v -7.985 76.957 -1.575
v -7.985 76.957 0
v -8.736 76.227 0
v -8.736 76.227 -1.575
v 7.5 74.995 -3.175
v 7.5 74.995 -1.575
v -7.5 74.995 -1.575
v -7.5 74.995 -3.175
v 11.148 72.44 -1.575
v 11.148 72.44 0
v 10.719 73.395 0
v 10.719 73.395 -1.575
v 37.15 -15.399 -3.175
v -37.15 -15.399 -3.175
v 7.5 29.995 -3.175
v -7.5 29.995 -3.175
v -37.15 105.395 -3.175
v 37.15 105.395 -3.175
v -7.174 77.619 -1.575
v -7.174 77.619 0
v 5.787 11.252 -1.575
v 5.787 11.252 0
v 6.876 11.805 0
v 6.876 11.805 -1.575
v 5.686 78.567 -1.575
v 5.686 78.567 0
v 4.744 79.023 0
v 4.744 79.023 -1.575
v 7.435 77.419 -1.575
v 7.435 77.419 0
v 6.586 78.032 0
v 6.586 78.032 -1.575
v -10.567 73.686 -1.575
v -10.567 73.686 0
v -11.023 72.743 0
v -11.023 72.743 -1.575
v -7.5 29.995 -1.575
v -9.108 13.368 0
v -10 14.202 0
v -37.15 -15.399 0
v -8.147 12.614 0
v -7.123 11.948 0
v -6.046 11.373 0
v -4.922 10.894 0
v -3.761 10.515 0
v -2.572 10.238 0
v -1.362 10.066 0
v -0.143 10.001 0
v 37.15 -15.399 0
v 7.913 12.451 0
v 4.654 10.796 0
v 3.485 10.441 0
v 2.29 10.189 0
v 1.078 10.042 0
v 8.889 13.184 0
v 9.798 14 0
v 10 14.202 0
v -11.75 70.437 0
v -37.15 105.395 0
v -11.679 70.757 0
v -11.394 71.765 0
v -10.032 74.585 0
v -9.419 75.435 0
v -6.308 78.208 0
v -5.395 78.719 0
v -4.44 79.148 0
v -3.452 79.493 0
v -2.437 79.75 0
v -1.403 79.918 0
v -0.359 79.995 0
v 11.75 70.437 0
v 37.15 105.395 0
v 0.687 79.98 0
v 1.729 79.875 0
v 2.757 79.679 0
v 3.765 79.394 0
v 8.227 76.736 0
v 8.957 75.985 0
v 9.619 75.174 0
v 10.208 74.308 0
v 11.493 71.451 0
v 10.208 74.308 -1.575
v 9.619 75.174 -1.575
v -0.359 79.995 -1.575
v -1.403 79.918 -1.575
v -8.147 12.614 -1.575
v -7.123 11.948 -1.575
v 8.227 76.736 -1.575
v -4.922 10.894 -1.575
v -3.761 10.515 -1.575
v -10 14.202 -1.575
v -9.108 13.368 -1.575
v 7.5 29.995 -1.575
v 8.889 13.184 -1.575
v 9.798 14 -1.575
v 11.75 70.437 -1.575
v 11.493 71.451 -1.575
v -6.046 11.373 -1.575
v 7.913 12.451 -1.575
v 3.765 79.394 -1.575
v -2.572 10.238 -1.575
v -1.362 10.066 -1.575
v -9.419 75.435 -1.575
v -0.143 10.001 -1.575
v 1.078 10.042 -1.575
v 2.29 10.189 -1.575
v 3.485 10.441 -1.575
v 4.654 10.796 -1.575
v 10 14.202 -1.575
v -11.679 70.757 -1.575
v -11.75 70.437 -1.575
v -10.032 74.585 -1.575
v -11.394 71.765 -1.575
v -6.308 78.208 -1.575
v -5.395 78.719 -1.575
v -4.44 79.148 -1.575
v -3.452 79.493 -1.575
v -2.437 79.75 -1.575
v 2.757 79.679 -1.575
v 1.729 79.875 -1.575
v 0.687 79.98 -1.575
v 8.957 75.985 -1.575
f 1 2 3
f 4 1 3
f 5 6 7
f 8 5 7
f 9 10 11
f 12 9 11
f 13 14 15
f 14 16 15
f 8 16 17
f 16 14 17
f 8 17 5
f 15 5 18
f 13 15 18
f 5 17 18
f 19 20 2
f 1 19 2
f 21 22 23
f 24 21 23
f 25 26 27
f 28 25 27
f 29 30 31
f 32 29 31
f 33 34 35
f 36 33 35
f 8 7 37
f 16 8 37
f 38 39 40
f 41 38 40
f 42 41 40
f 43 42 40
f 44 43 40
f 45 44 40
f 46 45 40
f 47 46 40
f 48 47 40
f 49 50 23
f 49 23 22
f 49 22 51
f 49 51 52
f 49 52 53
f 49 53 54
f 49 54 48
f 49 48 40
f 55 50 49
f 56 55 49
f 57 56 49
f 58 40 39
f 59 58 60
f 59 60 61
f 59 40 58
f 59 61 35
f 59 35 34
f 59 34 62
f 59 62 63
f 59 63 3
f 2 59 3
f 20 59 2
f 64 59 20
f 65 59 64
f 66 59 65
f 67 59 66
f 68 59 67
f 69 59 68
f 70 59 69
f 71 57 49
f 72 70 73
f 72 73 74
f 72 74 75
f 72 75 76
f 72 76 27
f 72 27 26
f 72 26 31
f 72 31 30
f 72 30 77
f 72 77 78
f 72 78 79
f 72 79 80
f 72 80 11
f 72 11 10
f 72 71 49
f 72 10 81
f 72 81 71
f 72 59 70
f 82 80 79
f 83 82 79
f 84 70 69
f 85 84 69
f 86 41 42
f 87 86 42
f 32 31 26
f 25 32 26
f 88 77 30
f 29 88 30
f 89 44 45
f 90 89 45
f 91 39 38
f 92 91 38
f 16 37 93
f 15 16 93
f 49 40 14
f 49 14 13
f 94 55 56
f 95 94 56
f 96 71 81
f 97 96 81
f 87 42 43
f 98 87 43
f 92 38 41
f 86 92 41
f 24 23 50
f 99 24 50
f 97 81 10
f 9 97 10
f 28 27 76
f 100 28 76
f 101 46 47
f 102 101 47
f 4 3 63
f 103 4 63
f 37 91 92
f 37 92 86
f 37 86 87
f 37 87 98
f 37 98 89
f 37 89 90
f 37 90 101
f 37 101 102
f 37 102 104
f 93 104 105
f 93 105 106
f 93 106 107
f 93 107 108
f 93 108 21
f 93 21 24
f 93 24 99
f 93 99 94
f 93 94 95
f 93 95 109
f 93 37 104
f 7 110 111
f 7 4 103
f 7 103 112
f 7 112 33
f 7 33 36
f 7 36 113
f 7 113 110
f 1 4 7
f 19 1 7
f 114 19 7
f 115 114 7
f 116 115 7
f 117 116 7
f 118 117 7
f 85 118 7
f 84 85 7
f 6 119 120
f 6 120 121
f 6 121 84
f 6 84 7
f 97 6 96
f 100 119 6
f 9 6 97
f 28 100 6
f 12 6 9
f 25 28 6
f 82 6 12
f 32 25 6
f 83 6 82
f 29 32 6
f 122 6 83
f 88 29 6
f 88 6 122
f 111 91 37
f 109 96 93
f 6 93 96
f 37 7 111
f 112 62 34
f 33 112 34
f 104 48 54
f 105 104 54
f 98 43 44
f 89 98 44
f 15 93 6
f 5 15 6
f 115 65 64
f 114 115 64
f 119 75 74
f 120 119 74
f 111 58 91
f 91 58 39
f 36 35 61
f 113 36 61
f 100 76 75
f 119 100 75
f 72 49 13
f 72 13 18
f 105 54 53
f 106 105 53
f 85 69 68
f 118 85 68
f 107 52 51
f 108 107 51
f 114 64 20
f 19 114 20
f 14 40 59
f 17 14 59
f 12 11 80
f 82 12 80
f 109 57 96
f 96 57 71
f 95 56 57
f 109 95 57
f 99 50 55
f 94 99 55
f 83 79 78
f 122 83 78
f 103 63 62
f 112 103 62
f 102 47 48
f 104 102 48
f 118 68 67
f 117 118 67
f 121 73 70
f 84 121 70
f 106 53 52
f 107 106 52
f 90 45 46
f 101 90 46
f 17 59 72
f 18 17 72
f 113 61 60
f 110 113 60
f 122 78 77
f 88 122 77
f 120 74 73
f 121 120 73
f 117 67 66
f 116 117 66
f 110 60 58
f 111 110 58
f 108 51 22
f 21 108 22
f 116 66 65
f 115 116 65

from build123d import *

# Parameters (mm, degrees)
F1_W     = 74.2999784
F1_H     = 120.793891
F2_DEPTH = 3.175
F3_DEPTH = 1.5748
F5_DEPTH = 1.6012
F7_DEPTH = 187


# Not quite as in the source:
# - an extrude ends at something that could not be found from the text; its depth is read off the source's solid


with BuildPart() as f2:
    # F1 (on Top) → F2 (new body)
    with BuildSketch(Plane.XY):
        with Locations((0, 44.9976621)):
            Rectangle(F1_W, F1_H)
    extrude(amount=-F2_DEPTH)

    # F0 (on Top) → F3 (cut)
    with BuildSketch(Plane.XY):
        Polygon((-11.67892, 70.7573642), (-11.7499892, 70.4366892), (-10.0000054, 14.202029), (-9.1080082, 13.367766), (-8.146669, 12.614402), (-7.1233538, 11.9477028), (-6.045835, 11.372723), (-4.9222914, 10.8938568), (-3.7612828, 10.514711), (-2.5716484, 10.2382066), (-1.3624306, 10.0664518), (-0.142875, 10.0007166), (1.0777982, 10.0415598), (2.2902418, 10.1886004), (3.4852864, 10.4407716), (4.653788, 10.7961176), (5.7868566, 11.2519714), (6.875907, 11.8048532), (7.9126334, 12.4505212), (8.889111, 13.1840986), (9.7979484, 13.9999974), (10.0000054, 14.202029), (11.7499892, 70.4366892), (11.4929158, 71.4514954), (11.1483648, 72.440038), (10.7189524, 73.3947986), (10.2079806, 74.3084874), (9.6193102, 75.1741702), (8.957437, 75.985243), (8.2274156, 76.735559), (7.4347324, 77.4193778), (6.5855088, 78.0315178), (5.6861456, 78.5673054), (4.7435008, 79.0226766), (3.7647626, 79.3941516), (2.7573732, 79.678911), (1.728978, 79.8747958), (0.687451, 79.980282), (-0.3593084, 79.9946076), (-1.40335, 79.917671), (-2.4366982, 79.7500056), (-3.4515044, 79.4929068), (-4.440047, 79.1483558), (-5.3947822, 78.7189688), (-6.3084964, 78.207997), (-7.1741538, 77.6193266), (-7.985252, 76.9574534), (-8.7355426, 76.2274066), (-9.4193614, 75.4347488), (-10.0315014, 74.5854998), (-10.5673144, 73.6861366), (-11.0226602, 72.7434918), (-11.3941352, 71.7647536), align=None)
    extrude(amount=-F3_DEPTH, mode=Mode.SUBTRACT)

    # F4 (on face) → F5 (cut, through all)
    with BuildSketch(Plane.XY.offset(-1.5748)):
        Polygon((7.5, 74.9946076), (-7.5, 74.9946076), (-7.5, 29.9946076), (0, 29.9946076), (7.5, 29.9946076), align=None)
    extrude(amount=-F5_DEPTH, mode=Mode.SUBTRACT)

    # F6 (on Top) → F7 (cut, through all)
    with BuildSketch(Plane.XY):
        Polygon((-10.7912024307, 73.8066075367), (-11.2561967507, 72.8439886266), (-11.6355402146, 71.8445191089), (-11.9253249204, 70.8194431888), (-12.0048558585, 70.4605875443), (-10.2505992593, 14.0886235531), (-9.2734099156, 13.1746824405), (-8.2946132005, 12.4076376674), (-7.2527155028, 11.7288318004), (-6.155627842, 11.1434097699), (-5.0116809128, 10.6558474546), (-3.8295896081, 10.2698167625), (-2.6183487878, 9.9882904244), (-1.3871727116, 9.8134167162), (-0.1454684467, 9.7464876822), (1.0973724592, 9.7880726041), (2.3318323641, 9.9377832588), (3.5485785618, 10.1945338008), (4.7383012319, 10.5563332129), (5.8919487163, 11.0204662668), (7.0007735223, 11.5833870046), (8.0563268906, 12.240780346), (9.0505396482, 12.9876812578), (9.9727120125, 13.8155513756), (10.250752791, 14.0935572024), (12.00497648, 70.4644636422), (11.7364147609, 71.5246203819), (11.3845631065, 72.5341091055), (10.9460529906, 73.5090976745), (10.4242555991, 74.442144141), (9.8231127621, 75.3261685703), (9.1472184874, 76.1544230786), (8.4017288342, 76.9206373493), (7.5922505458, 77.6189446578), (6.7250358763, 78.2440530365), (5.8066165367, 78.7911931616), (4.8440002256, 79.2562121642), (3.8445253314, 79.6355576688), (2.8157931282, 79.9263500525), (1.7656080971, 80.1263852965), (0.7020137501, 80.2341064847), (-0.3669184196, 80.2487355339), (-1.4330803845, 80.1701688593), (-2.4883265282, 79.9989504193), (-3.5246322079, 79.7364047759), (-4.5341166426, 79.3845546164), (-5.509078548, 78.9460707649), (-6.4421534102, 78.4242719991), (-7.3261519012, 77.8231291621), (-8.154434062, 77.1472334884), (-8.9206223557, 76.4017179349), (-9.6189282578, 75.5922672148), (-10.2440360096, 74.725027477), align=None)
    extrude(amount=F7_DEPTH, mode=Mode.SUBTRACT)


solid = f2.part
